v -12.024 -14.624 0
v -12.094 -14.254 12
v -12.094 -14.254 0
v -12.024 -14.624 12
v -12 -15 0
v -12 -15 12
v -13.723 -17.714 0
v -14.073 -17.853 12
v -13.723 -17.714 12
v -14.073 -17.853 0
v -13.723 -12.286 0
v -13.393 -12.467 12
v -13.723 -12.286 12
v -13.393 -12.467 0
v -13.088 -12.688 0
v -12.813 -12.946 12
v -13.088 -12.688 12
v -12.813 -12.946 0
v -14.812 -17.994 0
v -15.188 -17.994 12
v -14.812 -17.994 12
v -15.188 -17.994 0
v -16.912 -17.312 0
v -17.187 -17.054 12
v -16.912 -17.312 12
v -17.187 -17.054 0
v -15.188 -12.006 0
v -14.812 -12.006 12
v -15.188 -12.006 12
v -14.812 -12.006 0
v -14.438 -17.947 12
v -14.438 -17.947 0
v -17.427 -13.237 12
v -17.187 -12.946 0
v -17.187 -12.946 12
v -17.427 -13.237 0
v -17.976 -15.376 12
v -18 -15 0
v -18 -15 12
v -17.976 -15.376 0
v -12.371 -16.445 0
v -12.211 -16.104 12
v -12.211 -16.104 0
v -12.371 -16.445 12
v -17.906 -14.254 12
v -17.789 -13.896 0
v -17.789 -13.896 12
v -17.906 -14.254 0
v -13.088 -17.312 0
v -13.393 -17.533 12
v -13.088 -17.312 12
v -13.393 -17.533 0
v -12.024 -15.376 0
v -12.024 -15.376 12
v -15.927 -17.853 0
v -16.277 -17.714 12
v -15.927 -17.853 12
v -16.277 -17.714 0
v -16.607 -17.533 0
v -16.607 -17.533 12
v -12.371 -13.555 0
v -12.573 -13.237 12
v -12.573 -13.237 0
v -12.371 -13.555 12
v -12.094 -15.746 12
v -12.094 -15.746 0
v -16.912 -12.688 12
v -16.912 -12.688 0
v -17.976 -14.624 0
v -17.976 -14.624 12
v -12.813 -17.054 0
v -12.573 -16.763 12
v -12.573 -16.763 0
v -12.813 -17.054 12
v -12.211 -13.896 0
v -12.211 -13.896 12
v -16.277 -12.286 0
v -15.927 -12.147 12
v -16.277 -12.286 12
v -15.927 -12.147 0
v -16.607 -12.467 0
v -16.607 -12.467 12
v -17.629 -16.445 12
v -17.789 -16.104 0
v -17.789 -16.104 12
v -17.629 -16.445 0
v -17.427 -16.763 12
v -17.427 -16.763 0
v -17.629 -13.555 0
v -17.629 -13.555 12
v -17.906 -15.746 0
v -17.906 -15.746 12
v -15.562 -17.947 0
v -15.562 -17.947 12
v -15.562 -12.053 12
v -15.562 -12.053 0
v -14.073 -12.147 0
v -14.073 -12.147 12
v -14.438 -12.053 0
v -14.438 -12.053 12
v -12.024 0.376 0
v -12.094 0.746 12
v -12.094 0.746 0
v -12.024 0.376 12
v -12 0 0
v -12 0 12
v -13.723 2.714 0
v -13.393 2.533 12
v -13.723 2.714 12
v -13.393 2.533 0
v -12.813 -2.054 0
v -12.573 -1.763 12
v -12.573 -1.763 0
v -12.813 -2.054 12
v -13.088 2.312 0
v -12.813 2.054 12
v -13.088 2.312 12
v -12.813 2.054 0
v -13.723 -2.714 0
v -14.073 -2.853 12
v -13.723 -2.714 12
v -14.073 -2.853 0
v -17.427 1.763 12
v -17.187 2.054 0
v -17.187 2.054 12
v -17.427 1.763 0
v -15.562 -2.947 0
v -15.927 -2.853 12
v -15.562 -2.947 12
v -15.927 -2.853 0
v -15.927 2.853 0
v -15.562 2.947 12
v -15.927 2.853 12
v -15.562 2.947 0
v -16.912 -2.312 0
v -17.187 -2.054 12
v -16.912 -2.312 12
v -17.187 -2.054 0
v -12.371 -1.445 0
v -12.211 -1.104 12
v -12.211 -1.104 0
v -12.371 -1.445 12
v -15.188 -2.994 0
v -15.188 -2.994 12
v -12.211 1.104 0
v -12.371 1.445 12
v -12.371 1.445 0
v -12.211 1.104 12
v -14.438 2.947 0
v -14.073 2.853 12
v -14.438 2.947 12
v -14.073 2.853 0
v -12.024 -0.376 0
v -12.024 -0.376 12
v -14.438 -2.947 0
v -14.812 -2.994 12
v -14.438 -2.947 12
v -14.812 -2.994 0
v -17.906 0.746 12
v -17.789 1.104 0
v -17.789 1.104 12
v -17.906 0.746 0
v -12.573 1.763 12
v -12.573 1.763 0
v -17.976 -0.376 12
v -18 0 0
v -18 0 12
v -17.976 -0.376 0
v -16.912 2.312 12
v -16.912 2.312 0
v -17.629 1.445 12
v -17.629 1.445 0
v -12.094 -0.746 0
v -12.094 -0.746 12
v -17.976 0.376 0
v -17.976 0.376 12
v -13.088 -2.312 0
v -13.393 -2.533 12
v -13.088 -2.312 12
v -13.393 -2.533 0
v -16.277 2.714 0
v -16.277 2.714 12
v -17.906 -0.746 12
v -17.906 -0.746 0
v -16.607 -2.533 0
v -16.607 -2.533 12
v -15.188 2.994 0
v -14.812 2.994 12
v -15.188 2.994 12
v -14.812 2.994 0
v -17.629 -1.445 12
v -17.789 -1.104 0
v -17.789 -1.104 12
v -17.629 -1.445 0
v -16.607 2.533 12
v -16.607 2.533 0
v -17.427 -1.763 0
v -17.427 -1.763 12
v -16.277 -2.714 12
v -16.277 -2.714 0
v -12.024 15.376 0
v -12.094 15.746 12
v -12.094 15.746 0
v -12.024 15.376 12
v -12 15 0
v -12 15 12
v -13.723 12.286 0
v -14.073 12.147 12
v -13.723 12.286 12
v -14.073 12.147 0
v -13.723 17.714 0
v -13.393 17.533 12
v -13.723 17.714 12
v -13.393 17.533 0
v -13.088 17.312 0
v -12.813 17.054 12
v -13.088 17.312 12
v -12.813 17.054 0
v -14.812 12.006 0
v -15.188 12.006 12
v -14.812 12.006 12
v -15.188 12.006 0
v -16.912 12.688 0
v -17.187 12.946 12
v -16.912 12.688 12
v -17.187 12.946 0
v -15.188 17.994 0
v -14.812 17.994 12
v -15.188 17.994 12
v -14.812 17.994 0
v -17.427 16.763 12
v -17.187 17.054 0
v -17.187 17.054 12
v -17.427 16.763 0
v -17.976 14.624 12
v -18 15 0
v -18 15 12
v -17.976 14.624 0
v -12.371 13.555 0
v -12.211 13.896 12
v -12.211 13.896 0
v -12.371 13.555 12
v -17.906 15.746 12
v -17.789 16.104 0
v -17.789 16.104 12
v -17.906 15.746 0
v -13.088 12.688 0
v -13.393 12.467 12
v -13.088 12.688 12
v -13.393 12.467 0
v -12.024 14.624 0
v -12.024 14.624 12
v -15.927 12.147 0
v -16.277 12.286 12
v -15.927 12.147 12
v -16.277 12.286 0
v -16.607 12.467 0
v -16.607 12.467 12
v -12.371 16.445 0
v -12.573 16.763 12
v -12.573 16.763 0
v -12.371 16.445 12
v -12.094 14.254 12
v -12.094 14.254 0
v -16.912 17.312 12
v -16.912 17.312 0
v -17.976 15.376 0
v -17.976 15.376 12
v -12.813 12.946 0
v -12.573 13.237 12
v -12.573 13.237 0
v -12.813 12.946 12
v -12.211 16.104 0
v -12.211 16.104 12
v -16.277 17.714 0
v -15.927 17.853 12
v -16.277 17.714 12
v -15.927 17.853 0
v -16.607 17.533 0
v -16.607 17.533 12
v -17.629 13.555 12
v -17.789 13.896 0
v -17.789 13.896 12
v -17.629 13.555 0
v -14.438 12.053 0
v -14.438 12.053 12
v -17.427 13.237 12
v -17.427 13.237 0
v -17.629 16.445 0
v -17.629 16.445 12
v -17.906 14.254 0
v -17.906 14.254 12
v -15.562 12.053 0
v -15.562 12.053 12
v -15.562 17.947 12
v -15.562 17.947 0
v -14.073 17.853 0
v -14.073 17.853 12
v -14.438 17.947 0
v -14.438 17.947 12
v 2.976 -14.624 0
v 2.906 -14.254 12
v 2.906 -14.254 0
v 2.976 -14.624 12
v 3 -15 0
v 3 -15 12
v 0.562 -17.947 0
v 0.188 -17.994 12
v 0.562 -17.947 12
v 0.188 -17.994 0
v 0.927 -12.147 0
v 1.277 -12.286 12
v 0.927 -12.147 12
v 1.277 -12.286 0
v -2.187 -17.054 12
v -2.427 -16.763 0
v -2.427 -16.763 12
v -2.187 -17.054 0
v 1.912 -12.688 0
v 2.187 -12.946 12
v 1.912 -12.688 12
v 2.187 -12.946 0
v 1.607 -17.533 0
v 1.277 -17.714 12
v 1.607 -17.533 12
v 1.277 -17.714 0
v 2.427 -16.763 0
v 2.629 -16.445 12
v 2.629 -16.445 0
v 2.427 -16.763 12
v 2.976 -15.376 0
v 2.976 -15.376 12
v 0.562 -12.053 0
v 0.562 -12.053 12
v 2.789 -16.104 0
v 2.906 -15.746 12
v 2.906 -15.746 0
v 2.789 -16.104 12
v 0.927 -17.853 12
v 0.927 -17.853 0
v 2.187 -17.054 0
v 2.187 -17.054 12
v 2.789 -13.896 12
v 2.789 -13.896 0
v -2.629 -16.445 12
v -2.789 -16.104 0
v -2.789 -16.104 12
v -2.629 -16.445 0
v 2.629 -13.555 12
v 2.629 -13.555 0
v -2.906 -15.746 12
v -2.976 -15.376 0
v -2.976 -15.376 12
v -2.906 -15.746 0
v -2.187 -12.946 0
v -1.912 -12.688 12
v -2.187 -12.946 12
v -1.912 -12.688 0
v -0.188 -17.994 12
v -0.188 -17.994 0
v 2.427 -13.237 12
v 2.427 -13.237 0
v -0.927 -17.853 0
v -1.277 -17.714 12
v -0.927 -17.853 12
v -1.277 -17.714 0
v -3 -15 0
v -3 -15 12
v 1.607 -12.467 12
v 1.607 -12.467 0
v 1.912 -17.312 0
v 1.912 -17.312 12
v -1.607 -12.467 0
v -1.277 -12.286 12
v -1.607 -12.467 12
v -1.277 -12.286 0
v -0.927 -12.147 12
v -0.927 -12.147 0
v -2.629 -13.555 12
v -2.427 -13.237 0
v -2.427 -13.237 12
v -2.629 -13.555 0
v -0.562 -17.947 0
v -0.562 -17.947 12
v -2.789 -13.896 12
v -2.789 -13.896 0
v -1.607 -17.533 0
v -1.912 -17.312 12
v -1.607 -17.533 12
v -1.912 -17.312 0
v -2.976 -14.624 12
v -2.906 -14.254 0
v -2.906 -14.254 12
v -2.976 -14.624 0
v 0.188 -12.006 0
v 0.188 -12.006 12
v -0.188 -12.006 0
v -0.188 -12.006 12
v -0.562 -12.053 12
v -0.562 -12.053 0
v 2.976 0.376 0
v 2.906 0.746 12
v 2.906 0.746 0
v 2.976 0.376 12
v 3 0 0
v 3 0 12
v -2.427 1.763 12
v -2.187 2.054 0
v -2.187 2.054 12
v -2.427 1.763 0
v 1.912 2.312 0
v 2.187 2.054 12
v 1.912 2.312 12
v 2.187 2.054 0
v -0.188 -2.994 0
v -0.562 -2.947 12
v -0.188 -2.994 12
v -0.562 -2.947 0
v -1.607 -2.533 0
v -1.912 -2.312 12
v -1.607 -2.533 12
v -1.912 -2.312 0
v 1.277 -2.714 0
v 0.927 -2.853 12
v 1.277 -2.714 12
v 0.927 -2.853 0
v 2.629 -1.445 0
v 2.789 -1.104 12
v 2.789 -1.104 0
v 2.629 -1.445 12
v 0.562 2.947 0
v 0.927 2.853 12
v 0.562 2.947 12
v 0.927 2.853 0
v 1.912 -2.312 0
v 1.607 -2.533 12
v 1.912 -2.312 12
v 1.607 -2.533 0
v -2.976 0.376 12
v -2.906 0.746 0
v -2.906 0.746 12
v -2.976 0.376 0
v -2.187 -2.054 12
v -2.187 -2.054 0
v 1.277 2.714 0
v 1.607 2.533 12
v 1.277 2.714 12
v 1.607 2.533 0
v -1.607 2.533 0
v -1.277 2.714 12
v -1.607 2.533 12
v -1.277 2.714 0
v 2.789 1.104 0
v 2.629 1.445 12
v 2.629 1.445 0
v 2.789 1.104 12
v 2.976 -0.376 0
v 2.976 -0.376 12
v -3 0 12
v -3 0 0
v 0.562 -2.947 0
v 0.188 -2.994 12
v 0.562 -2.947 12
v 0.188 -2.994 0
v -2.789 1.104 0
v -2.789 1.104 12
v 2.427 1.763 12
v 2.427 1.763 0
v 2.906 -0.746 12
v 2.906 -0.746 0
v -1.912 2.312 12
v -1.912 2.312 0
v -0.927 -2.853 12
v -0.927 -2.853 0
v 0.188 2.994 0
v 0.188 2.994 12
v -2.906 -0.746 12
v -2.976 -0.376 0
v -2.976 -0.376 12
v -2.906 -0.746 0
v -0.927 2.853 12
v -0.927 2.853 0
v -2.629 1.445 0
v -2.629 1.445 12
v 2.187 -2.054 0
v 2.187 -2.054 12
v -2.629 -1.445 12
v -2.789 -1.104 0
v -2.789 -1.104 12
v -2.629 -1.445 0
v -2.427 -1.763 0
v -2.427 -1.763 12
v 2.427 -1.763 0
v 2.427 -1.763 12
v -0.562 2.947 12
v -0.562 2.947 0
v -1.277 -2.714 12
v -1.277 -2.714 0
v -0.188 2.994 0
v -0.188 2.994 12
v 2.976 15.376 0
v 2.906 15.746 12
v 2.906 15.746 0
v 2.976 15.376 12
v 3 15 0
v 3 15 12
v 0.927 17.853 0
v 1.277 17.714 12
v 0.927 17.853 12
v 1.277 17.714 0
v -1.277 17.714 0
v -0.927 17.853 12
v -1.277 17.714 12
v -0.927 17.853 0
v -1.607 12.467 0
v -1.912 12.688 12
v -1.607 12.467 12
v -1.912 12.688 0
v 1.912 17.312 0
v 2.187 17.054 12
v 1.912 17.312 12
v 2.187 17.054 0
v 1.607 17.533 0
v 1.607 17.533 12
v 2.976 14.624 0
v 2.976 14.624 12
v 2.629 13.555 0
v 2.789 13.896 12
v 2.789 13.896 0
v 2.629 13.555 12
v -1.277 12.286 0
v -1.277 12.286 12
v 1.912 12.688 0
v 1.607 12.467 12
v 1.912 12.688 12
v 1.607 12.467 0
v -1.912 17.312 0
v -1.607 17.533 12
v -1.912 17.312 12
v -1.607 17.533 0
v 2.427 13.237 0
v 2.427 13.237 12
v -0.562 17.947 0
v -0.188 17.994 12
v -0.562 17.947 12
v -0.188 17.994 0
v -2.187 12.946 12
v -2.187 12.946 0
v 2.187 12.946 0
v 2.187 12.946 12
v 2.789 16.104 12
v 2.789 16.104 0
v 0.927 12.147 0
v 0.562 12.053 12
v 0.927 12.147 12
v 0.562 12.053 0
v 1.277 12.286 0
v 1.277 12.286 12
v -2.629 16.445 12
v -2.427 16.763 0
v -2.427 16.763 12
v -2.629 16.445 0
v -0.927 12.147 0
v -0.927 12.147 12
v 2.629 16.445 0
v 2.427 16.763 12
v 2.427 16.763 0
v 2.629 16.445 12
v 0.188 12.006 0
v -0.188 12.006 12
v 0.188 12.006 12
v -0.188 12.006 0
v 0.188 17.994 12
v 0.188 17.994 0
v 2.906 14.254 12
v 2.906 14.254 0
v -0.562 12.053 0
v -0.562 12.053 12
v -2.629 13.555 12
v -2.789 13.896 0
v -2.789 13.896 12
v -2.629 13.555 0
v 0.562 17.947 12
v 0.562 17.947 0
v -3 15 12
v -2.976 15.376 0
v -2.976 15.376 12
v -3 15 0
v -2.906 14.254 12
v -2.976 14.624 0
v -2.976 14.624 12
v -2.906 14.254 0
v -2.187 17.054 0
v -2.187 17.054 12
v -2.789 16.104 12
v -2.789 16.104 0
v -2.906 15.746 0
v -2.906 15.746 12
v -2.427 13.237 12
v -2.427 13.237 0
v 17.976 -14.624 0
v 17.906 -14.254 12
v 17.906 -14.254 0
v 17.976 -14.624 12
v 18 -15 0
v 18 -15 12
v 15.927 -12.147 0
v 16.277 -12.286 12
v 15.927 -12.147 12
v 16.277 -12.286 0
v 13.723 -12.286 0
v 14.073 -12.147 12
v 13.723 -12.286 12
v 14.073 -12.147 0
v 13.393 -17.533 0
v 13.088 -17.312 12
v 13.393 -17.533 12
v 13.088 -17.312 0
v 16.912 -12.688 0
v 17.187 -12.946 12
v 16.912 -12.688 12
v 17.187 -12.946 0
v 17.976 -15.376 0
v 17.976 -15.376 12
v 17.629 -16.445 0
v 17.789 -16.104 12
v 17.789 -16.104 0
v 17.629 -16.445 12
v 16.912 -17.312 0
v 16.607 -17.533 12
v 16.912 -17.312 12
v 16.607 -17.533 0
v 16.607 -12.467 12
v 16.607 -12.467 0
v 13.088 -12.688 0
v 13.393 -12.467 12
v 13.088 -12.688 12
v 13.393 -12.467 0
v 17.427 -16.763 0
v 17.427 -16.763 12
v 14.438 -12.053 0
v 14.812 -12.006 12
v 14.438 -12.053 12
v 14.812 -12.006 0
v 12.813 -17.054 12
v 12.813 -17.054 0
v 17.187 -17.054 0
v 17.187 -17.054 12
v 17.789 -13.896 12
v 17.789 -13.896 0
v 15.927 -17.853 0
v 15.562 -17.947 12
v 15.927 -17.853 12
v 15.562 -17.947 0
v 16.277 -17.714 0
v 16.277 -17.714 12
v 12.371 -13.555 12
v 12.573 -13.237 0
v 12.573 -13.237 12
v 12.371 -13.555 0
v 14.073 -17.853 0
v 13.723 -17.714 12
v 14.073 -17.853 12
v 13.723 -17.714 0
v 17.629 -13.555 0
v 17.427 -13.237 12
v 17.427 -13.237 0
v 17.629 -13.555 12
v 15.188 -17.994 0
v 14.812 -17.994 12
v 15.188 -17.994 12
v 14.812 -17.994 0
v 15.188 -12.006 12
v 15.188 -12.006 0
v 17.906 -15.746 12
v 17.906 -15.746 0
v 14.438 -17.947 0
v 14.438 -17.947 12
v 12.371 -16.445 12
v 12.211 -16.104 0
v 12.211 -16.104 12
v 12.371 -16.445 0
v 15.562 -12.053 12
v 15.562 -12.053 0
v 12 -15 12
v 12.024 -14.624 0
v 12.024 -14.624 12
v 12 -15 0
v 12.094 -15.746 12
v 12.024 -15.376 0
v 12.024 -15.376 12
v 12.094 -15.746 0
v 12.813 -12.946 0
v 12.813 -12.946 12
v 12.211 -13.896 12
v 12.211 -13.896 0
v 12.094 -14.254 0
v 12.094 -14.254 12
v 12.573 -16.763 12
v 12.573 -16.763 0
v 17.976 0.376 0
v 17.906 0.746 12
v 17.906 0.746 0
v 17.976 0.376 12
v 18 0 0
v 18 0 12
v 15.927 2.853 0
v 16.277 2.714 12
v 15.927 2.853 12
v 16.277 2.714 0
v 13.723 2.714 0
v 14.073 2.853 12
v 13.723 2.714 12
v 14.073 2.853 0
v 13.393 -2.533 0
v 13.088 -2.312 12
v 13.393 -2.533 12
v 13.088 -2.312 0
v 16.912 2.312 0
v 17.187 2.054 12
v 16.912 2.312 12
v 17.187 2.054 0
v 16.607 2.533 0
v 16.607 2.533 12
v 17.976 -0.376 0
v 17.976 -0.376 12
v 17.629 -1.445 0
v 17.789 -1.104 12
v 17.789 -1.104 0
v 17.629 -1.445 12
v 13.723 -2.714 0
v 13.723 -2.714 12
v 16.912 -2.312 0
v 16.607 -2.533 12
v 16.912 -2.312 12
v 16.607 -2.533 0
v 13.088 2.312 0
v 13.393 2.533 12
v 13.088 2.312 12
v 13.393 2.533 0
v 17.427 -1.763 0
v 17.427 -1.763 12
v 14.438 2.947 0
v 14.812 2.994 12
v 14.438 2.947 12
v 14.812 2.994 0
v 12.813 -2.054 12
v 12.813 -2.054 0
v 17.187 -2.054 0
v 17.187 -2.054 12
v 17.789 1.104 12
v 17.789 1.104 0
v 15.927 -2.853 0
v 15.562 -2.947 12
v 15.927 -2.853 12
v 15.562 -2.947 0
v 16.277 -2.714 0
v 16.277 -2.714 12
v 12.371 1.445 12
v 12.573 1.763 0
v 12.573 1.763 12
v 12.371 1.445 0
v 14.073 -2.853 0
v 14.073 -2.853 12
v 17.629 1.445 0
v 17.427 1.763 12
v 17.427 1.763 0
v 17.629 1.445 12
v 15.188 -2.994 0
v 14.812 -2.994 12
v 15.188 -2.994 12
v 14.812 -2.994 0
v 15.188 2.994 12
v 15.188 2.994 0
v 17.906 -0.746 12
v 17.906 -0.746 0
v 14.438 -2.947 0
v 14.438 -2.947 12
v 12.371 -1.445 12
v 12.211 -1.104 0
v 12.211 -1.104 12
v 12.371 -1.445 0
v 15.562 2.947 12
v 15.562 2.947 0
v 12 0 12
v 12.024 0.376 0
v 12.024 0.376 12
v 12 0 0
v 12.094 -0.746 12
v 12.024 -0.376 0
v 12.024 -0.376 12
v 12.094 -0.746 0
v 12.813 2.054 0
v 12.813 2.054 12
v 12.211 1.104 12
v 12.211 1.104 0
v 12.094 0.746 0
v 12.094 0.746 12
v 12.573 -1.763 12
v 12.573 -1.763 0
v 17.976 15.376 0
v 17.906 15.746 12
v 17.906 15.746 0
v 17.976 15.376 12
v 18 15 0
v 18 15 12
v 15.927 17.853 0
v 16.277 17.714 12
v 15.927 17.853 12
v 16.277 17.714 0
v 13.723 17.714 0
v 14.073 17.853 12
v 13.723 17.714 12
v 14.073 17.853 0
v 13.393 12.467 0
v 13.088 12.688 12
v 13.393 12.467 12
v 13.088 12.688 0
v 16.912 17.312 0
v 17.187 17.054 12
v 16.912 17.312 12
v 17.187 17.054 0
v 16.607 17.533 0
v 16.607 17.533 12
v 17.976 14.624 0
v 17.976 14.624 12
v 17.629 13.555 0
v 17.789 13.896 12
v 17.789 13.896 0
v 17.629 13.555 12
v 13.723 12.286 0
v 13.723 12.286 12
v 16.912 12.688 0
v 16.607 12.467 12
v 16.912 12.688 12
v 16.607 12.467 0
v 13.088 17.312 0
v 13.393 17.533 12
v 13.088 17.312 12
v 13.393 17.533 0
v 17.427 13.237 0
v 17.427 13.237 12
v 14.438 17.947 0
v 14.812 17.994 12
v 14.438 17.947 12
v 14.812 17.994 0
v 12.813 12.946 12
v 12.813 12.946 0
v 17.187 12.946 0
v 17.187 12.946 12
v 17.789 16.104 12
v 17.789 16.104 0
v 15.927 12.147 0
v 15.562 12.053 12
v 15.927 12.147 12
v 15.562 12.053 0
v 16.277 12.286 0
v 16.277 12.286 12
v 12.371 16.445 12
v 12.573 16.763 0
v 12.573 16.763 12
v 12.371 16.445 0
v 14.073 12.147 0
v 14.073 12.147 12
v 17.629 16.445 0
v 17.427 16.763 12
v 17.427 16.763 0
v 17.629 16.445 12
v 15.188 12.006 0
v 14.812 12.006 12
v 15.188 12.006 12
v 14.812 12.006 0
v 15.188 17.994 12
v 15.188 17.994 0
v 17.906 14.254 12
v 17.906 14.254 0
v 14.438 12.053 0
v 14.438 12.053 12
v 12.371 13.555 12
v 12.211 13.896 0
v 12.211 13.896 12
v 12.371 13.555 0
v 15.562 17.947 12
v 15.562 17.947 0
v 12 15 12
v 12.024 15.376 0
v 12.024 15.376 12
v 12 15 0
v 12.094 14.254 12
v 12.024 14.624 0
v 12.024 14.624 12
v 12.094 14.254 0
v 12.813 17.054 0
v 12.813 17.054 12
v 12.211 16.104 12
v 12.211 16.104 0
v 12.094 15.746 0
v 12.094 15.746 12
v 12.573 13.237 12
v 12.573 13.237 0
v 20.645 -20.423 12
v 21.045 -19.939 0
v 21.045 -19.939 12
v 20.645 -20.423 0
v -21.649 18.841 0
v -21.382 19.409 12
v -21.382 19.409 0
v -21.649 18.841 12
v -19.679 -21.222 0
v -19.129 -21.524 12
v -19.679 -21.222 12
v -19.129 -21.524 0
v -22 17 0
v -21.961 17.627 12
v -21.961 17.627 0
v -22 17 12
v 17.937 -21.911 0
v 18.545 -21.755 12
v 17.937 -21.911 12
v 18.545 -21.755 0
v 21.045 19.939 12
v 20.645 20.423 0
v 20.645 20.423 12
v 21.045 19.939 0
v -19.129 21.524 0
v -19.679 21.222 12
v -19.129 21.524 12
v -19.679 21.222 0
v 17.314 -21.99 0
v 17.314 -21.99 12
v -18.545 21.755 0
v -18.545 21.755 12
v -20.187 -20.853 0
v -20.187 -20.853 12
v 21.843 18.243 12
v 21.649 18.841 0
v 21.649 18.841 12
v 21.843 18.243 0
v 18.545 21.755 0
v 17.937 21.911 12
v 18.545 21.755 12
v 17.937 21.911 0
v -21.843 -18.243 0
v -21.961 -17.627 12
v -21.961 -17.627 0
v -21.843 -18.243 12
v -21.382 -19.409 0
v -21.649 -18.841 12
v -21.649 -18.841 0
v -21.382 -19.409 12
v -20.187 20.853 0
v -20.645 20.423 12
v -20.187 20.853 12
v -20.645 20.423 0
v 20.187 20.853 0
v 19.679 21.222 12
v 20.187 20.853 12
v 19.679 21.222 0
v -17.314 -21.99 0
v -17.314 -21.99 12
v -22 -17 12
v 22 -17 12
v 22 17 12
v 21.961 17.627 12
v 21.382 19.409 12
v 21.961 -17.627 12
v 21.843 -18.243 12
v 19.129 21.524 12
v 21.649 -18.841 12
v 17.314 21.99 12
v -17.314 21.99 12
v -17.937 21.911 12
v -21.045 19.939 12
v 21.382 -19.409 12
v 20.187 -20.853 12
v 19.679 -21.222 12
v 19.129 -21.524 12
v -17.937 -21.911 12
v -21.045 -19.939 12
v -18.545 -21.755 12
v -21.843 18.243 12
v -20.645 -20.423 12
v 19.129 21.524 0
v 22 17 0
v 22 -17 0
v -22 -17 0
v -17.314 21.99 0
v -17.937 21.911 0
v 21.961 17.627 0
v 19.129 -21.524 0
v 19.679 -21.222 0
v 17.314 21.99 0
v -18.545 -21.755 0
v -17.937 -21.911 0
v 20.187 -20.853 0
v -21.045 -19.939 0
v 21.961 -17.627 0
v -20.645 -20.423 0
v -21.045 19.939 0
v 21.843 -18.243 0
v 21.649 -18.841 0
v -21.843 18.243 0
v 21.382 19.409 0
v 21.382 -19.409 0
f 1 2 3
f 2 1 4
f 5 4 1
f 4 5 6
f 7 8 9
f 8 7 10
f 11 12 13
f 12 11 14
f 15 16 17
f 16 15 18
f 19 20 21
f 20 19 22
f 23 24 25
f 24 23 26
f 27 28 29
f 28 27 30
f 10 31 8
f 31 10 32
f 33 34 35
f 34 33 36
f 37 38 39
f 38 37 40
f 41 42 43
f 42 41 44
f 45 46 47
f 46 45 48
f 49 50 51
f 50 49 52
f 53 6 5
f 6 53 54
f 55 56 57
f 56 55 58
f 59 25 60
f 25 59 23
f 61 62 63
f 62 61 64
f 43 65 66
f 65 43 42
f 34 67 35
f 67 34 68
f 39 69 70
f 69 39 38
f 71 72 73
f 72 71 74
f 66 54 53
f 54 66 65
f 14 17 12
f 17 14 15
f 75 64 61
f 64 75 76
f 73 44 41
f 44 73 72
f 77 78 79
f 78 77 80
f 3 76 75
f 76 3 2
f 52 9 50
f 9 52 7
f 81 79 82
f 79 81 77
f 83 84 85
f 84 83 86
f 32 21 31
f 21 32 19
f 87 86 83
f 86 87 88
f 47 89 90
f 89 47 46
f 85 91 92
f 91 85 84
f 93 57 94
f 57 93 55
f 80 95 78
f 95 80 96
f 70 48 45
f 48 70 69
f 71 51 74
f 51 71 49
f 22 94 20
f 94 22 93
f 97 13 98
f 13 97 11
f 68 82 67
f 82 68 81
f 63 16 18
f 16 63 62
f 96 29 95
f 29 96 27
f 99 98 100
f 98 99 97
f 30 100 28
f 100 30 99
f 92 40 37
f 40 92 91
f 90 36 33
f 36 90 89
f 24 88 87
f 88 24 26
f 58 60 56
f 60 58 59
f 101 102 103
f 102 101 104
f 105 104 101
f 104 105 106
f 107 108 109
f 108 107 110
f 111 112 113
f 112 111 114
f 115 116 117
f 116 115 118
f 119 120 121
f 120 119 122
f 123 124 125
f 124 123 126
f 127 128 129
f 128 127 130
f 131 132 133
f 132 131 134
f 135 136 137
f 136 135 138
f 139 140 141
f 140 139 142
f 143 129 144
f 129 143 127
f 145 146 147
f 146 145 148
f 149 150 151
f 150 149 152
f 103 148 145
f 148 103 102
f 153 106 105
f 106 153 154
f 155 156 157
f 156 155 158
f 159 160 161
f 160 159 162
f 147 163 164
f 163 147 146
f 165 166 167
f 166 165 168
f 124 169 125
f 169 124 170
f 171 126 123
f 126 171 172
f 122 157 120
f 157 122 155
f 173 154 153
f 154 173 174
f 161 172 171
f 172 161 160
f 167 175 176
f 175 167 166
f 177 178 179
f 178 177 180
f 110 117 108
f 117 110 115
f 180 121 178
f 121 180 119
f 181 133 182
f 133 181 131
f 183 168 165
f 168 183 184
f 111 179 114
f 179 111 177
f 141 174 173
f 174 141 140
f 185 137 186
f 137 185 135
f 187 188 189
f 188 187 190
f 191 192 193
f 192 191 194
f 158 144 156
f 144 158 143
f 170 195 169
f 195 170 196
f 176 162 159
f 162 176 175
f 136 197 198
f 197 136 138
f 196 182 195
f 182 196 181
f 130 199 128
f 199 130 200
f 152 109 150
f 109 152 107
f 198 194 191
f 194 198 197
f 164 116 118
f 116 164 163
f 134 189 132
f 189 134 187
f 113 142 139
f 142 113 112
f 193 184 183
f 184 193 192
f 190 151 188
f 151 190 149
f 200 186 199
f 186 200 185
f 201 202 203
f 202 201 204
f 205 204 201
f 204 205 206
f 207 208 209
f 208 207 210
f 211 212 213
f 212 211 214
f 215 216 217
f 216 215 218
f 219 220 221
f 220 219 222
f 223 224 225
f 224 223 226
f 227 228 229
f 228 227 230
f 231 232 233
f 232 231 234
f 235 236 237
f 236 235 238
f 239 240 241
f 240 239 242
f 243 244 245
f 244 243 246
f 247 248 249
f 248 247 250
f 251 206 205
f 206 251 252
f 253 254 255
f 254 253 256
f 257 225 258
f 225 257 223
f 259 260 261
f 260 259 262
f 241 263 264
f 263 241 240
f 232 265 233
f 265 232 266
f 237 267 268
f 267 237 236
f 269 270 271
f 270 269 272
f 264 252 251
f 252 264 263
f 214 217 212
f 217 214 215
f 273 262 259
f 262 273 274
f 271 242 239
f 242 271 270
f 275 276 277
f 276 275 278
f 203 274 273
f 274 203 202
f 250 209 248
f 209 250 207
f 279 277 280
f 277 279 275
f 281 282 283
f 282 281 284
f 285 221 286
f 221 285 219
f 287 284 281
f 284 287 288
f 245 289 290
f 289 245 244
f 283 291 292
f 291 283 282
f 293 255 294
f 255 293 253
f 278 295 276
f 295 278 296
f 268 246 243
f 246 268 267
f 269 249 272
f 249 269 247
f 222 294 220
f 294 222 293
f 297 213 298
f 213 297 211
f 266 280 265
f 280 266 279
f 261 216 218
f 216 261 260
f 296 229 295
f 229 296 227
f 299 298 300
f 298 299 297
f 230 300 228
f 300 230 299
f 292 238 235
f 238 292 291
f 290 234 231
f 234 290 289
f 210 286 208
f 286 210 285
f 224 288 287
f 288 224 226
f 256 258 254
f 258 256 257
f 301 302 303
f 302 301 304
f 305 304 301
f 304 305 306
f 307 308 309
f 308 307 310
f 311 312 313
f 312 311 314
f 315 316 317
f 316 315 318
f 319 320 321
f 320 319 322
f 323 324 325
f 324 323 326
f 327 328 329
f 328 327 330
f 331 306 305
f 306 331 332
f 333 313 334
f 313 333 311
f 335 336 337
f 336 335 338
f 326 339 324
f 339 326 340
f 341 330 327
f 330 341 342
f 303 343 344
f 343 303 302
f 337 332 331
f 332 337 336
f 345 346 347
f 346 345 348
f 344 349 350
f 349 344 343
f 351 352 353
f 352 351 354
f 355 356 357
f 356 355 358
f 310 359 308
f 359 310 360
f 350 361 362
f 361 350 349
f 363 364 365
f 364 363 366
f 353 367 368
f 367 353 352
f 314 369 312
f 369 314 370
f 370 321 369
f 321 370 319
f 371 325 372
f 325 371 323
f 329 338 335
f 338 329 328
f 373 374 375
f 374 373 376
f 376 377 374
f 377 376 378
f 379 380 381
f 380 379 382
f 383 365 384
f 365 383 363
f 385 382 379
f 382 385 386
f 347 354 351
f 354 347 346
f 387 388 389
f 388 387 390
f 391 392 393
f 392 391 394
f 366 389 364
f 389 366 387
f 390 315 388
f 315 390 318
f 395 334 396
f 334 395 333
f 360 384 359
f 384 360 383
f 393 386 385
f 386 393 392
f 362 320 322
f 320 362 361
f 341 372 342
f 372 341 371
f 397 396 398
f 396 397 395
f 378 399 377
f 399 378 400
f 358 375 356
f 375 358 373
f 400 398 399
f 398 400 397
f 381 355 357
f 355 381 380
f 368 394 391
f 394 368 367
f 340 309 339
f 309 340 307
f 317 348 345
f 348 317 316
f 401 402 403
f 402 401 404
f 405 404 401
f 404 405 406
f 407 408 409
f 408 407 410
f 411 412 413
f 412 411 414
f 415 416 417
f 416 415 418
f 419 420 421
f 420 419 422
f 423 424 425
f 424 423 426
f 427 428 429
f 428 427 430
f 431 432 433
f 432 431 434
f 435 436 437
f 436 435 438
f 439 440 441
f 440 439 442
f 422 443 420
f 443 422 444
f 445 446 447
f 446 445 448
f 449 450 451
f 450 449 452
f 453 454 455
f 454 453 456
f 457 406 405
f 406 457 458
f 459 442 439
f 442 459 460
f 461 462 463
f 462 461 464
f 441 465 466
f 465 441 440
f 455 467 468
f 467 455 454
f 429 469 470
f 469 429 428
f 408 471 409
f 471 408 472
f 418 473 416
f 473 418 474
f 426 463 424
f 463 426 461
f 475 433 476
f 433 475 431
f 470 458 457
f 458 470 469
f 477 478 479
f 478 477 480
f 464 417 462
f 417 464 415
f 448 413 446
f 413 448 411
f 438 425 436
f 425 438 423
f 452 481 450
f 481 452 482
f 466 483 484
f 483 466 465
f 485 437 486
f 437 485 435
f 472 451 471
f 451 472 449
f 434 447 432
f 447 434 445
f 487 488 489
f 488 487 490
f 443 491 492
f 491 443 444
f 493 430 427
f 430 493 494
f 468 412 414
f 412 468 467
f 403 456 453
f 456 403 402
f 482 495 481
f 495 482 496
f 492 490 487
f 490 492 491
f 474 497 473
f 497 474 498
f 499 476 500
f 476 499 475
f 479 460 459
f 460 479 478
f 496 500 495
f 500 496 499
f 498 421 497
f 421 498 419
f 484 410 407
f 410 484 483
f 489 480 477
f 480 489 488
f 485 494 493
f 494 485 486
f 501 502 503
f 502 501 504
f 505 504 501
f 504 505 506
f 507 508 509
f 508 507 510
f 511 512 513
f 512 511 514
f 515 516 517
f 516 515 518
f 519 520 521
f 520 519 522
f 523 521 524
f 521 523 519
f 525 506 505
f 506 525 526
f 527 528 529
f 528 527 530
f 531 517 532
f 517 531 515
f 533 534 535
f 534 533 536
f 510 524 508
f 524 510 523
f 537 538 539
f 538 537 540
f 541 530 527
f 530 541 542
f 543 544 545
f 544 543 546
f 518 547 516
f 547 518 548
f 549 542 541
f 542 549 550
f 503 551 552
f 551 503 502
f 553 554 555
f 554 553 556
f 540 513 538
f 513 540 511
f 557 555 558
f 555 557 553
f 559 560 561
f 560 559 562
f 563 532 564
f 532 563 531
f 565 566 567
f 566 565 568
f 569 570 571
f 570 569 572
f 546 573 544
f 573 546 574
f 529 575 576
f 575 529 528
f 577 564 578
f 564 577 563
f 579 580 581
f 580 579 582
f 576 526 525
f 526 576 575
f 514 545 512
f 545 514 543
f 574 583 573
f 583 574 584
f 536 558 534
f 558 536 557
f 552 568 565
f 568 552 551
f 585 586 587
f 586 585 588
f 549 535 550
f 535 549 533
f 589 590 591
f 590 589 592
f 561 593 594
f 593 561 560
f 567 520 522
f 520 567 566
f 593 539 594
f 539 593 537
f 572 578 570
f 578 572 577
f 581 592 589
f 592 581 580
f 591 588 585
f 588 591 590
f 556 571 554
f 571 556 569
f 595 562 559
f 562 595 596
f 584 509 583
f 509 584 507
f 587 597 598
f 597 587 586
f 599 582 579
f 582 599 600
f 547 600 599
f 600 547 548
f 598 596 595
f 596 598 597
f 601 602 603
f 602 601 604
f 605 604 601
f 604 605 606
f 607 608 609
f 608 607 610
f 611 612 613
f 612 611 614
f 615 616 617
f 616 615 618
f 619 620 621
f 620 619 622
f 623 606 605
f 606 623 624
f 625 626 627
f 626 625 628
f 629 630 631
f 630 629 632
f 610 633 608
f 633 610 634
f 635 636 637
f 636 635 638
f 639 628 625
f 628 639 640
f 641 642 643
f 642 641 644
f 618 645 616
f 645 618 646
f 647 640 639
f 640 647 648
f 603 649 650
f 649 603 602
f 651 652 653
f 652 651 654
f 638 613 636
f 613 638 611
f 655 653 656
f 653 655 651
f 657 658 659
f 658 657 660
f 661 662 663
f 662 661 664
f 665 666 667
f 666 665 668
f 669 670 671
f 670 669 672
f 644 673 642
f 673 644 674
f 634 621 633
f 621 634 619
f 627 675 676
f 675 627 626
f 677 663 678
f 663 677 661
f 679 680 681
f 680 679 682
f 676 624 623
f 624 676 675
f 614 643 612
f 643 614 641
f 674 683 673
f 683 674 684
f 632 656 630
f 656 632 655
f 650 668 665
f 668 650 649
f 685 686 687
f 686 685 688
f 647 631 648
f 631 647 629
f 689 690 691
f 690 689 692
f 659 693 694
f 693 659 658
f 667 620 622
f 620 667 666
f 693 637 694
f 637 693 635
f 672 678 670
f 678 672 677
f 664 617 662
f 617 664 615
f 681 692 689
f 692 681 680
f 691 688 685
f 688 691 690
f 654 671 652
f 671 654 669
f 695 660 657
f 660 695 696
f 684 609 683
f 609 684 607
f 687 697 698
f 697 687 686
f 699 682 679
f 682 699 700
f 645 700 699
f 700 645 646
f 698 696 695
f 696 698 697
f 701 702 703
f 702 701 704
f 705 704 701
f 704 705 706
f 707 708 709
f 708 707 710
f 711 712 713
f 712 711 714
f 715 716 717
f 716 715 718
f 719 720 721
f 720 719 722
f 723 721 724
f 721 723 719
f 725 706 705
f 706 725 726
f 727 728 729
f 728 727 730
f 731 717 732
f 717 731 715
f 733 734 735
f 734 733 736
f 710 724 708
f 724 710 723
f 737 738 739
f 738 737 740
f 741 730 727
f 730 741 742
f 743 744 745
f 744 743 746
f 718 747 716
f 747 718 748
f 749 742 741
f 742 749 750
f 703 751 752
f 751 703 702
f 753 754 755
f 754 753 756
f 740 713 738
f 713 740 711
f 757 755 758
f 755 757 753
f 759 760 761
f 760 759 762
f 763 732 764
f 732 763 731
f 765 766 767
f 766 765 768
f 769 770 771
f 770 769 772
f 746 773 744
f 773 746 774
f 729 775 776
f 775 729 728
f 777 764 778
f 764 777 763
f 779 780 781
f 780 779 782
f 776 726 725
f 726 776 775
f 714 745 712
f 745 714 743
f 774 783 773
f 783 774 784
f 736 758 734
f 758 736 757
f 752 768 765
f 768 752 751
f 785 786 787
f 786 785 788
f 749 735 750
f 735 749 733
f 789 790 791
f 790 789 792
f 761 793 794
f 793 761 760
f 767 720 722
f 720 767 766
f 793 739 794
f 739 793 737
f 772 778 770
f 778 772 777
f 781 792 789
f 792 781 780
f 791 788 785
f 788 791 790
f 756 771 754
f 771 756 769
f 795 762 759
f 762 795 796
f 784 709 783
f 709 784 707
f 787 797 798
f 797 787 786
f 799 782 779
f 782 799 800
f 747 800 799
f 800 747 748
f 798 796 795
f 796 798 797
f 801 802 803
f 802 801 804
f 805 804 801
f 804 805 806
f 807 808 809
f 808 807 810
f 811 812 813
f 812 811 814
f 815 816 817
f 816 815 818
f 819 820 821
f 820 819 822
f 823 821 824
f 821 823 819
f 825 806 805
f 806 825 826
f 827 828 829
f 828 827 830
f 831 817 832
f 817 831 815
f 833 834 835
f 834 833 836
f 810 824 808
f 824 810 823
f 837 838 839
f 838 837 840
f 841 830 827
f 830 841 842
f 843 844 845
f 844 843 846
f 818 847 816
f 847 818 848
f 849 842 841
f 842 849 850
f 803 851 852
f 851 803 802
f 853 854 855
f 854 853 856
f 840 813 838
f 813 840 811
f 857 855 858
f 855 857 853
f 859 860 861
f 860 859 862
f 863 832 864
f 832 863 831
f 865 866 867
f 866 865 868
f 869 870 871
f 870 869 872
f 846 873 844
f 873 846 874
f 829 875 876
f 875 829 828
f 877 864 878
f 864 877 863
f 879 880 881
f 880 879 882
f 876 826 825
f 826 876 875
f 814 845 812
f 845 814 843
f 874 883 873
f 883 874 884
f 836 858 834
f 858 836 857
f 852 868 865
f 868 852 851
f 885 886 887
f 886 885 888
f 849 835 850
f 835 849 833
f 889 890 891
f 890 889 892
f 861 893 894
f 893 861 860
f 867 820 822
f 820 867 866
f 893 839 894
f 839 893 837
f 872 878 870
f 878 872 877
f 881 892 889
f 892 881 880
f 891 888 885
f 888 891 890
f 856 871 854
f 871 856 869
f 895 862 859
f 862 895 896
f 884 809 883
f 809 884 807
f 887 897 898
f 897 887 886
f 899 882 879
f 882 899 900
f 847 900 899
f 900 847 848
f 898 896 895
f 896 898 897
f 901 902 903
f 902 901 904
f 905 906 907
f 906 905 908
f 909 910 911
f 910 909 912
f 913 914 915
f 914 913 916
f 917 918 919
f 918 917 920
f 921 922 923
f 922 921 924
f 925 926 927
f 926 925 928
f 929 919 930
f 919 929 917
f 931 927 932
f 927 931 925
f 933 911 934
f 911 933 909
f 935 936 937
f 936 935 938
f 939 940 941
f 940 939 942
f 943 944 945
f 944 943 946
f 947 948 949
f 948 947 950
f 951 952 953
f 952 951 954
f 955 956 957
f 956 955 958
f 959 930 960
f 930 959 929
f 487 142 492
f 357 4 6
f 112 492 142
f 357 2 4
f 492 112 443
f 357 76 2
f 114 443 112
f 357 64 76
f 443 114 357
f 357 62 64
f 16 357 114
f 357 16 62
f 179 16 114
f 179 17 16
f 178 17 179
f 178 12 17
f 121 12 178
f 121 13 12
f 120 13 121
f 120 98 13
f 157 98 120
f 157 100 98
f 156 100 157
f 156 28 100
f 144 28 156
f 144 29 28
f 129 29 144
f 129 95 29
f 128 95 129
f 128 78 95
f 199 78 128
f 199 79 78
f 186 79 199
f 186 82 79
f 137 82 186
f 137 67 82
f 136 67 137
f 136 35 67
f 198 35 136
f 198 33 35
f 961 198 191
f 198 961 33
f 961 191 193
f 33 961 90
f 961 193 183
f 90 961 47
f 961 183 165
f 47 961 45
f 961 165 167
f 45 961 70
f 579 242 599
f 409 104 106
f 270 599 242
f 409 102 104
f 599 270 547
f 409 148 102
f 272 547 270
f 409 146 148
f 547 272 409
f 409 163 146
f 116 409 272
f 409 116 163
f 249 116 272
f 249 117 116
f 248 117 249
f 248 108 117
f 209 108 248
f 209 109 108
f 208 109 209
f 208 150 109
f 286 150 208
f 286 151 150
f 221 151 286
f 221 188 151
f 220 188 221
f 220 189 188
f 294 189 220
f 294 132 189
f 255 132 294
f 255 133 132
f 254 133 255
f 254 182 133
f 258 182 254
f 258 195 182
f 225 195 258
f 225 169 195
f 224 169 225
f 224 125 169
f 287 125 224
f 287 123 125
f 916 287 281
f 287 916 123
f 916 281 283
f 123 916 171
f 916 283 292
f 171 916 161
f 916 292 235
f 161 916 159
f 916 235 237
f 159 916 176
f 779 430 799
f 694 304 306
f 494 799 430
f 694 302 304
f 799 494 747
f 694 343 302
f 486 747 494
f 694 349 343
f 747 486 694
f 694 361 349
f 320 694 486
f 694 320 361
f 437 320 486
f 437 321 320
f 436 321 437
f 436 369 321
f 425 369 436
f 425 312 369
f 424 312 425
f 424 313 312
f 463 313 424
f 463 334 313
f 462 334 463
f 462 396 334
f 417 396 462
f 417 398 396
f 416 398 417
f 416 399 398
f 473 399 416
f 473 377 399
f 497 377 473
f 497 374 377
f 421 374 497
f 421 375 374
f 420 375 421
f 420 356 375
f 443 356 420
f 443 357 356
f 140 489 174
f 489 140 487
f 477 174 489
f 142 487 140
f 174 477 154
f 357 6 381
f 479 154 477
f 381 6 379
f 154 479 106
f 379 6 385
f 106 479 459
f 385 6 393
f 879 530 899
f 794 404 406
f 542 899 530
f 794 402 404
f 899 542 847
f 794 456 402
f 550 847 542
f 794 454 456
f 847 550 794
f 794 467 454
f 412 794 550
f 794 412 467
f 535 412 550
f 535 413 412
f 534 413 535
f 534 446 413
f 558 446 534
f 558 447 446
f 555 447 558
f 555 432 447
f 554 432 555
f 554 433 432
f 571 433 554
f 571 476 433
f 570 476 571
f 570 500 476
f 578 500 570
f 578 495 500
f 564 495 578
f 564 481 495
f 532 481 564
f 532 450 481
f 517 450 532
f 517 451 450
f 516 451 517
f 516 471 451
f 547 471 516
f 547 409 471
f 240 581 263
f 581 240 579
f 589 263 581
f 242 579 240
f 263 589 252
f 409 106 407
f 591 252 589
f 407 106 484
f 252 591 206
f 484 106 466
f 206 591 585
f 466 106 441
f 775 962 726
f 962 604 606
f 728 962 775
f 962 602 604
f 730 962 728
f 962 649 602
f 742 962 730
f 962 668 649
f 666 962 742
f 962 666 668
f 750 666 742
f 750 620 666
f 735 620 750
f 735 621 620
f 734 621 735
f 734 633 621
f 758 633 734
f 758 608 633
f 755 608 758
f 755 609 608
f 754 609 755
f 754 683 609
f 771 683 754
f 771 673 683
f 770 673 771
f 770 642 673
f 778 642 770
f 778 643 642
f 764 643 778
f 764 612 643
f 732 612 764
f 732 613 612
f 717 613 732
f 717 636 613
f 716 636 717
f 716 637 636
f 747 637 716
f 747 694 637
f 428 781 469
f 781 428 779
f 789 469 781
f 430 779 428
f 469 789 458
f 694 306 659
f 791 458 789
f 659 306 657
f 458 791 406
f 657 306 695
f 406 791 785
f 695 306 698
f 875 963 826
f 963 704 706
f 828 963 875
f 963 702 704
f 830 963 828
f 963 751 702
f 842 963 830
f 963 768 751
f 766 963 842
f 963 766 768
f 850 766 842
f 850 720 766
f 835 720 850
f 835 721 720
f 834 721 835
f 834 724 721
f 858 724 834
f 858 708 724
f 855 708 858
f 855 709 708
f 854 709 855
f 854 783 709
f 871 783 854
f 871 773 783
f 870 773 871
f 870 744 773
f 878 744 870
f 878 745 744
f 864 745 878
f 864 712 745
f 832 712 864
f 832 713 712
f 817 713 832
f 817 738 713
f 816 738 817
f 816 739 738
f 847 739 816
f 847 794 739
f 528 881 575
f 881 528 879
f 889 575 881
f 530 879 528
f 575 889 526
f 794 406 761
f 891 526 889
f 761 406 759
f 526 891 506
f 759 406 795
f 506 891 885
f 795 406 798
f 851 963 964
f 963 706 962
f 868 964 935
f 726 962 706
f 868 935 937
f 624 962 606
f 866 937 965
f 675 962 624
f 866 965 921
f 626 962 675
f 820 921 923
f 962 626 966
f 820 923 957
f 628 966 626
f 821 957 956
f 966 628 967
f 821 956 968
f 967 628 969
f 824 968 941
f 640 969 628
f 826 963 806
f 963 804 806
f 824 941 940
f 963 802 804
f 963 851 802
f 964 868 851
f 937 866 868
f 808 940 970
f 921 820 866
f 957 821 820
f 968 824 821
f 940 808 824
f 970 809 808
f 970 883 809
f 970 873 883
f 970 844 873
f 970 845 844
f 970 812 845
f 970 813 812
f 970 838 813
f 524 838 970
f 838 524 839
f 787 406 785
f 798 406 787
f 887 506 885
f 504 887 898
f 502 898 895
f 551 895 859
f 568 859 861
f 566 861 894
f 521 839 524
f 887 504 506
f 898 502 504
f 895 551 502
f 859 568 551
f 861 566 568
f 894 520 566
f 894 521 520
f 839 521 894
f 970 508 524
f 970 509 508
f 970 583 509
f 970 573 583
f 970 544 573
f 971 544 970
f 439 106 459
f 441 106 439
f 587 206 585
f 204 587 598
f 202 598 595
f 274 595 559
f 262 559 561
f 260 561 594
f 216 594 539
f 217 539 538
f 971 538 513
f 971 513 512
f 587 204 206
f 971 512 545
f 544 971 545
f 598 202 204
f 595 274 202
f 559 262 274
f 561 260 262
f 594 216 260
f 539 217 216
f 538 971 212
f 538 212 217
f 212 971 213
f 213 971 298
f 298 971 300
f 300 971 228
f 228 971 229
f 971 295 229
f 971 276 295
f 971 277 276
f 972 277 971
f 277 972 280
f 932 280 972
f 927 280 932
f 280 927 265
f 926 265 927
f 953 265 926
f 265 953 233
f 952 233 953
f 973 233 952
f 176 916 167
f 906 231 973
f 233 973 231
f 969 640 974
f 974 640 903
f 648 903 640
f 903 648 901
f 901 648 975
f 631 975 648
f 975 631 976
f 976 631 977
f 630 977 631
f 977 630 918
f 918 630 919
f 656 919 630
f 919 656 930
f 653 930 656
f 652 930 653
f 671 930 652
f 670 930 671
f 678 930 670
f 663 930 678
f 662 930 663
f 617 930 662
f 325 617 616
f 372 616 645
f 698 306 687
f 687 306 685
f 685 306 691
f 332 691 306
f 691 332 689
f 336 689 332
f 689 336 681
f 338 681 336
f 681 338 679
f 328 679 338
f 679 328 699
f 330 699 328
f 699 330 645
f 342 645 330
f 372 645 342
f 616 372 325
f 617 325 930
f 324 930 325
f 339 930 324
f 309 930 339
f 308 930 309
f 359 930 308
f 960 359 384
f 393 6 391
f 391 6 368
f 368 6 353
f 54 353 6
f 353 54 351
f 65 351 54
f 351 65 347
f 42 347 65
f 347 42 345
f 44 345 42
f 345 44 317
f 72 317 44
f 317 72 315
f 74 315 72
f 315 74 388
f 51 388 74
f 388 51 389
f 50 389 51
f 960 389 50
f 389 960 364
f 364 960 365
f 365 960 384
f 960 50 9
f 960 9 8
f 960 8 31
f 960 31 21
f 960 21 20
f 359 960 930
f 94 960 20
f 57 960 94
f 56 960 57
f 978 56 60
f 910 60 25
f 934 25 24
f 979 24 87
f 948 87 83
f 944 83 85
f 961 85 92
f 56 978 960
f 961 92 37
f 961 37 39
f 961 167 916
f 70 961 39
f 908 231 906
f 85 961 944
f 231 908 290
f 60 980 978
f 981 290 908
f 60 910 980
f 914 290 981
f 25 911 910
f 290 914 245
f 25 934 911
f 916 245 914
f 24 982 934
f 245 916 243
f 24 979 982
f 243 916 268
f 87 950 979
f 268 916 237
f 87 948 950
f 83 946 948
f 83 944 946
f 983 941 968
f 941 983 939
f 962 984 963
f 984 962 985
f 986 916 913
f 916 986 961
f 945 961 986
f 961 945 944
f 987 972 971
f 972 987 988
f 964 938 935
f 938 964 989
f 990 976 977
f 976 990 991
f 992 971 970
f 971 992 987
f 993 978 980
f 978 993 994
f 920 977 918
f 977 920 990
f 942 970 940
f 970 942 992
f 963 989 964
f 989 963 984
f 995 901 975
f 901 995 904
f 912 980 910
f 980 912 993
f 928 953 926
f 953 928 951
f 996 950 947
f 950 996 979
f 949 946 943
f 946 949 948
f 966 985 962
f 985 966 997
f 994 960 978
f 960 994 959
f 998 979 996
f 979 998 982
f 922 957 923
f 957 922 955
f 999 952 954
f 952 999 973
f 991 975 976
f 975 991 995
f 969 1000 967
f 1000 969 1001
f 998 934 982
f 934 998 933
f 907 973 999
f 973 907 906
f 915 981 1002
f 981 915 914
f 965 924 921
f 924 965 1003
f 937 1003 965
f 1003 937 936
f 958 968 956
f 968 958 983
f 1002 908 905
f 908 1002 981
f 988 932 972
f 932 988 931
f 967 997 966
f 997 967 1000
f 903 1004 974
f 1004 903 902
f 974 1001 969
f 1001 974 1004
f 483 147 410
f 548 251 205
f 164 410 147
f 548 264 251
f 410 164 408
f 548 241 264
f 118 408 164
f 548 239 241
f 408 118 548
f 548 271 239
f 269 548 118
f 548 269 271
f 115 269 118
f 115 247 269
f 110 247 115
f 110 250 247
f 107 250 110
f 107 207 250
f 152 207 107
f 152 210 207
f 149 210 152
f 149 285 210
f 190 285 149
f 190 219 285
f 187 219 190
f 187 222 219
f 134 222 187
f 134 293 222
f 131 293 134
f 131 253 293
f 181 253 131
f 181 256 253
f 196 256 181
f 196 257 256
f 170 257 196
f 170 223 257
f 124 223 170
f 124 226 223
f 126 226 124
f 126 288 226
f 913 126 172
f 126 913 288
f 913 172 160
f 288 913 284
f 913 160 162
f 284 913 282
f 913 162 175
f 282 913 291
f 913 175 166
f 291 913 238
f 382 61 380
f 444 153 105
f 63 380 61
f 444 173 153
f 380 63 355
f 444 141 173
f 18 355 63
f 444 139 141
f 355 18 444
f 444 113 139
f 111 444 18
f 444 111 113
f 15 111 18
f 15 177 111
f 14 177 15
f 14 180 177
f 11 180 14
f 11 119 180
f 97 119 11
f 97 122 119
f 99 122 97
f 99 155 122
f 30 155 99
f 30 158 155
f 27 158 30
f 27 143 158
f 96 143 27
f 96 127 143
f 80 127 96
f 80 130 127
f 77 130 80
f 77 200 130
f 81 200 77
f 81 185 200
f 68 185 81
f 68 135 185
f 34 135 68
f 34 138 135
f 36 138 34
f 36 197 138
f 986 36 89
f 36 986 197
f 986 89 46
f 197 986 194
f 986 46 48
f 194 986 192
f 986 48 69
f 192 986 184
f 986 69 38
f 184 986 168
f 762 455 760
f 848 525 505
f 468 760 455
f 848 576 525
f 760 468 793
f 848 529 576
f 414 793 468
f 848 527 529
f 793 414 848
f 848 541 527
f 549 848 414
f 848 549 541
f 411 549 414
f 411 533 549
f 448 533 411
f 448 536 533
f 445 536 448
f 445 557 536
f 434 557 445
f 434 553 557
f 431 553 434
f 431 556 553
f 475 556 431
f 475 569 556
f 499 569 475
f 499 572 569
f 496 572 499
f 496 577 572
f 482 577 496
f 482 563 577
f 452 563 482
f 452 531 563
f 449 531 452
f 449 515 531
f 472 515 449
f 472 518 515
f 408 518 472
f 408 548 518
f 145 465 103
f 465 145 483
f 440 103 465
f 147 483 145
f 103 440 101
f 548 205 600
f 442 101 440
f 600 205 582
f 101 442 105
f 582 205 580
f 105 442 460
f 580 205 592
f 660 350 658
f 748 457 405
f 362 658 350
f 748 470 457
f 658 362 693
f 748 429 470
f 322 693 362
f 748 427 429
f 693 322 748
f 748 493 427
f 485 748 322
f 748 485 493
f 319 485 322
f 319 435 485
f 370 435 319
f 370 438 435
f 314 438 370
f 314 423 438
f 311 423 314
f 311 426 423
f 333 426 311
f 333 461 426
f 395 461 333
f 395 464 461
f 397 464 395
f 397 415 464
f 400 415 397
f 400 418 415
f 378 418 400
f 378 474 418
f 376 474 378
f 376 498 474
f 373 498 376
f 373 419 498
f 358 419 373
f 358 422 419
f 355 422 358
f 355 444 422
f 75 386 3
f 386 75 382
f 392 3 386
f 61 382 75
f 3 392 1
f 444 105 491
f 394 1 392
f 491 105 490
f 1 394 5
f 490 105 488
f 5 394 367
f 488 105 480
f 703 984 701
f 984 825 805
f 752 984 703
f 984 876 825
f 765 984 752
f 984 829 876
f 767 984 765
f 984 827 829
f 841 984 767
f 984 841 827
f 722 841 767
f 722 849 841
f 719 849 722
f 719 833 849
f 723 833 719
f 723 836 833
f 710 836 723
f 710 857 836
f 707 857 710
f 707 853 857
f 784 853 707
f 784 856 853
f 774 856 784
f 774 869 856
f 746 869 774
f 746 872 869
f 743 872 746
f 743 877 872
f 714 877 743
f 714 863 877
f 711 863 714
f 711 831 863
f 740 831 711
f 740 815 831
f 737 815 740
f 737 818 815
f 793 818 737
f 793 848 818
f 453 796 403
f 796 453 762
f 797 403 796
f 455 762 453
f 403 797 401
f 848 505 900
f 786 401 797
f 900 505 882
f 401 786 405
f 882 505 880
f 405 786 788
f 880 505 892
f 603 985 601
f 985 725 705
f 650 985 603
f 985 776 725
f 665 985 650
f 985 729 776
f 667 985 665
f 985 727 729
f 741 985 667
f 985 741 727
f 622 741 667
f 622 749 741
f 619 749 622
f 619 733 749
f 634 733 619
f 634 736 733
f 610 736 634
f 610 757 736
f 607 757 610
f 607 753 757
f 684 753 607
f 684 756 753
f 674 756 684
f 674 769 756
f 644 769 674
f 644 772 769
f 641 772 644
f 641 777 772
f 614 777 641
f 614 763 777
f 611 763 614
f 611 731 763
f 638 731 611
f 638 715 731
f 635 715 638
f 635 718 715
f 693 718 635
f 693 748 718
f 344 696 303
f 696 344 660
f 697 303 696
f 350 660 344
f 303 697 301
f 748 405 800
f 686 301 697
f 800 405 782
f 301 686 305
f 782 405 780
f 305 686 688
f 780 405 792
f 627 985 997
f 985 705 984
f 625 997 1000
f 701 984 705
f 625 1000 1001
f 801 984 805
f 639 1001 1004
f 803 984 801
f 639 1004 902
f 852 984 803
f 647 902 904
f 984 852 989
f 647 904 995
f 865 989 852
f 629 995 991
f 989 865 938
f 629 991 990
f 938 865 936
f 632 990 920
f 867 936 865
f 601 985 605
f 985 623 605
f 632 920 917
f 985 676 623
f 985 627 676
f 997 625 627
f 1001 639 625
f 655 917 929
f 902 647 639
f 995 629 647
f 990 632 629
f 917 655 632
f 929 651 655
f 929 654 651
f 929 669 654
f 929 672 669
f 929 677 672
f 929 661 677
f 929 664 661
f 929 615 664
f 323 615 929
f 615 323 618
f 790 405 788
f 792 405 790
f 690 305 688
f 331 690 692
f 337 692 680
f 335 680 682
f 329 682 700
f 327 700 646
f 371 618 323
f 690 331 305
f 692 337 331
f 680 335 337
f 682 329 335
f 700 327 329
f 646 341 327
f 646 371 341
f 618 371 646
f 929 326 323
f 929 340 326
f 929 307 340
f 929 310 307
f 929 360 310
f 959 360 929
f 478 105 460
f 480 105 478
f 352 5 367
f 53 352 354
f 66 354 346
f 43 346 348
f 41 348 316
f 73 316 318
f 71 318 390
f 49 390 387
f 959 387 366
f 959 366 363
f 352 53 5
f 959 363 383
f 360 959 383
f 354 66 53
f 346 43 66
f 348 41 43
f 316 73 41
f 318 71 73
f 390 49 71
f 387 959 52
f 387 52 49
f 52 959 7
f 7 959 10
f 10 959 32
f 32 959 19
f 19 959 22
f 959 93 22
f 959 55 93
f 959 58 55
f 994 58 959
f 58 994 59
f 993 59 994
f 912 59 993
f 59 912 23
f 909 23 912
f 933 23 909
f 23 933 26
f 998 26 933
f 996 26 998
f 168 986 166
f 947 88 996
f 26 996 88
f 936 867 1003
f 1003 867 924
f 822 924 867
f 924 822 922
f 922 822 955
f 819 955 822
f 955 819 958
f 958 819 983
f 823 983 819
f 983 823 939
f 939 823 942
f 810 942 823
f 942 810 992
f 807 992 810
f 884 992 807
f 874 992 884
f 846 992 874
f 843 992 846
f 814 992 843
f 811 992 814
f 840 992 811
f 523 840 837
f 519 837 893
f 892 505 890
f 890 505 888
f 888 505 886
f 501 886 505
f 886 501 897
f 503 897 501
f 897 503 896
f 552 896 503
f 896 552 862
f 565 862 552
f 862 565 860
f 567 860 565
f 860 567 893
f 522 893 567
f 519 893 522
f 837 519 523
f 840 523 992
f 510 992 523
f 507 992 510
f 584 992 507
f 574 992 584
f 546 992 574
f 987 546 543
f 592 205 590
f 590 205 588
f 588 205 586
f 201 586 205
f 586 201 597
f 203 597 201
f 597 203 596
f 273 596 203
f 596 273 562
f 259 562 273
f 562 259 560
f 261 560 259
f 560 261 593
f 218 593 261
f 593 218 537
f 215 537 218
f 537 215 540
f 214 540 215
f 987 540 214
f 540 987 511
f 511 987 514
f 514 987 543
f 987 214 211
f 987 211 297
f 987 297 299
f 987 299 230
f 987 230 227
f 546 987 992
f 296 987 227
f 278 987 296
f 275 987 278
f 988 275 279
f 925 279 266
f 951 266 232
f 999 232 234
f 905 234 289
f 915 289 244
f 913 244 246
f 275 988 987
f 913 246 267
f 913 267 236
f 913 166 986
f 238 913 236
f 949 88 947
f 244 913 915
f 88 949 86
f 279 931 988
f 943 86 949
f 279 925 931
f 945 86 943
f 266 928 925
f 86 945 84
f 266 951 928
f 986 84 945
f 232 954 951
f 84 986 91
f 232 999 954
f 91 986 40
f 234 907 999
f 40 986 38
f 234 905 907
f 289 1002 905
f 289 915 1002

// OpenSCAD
$fn = 50;


difference() {
	union() {
		hull() {
			translate(v = [-17.0000000000, 17.0000000000, 0]) {
				cylinder(h = 12, r = 5);
			}
			translate(v = [17.0000000000, 17.0000000000, 0]) {
				cylinder(h = 12, r = 5);
			}
			translate(v = [-17.0000000000, -17.0000000000, 0]) {
				cylinder(h = 12, r = 5);
			}
			translate(v = [17.0000000000, -17.0000000000, 0]) {
				cylinder(h = 12, r = 5);
			}
		}
	}
	union() {
		translate(v = [-15.0000000000, -15.0000000000, 0]) {
			translate(v = [0, 0, -100]) {
				cylinder(h = 200, r = 3.0000000000);
			}
		}
		translate(v = [-15.0000000000, 0.0000000000, 0]) {
			translate(v = [0, 0, -100]) {
				cylinder(h = 200, r = 3.0000000000);
			}
		}
		translate(v = [-15.0000000000, 15.0000000000, 0]) {
			translate(v = [0, 0, -100]) {
				cylinder(h = 200, r = 3.0000000000);
			}
		}
		translate(v = [0.0000000000, -15.0000000000, 0]) {
			translate(v = [0, 0, -100]) {
				cylinder(h = 200, r = 3.0000000000);
			}
		}
		translate(v = [0, 0, -100]) {
			cylinder(h = 200, r = 3.0000000000);
		}
		translate(v = [0.0000000000, 15.0000000000, 0]) {
			translate(v = [0, 0, -100]) {
				cylinder(h = 200, r = 3.0000000000);
			}
		}
		translate(v = [15.0000000000, -15.0000000000, 0]) {
			translate(v = [0, 0, -100]) {
				cylinder(h = 200, r = 3.0000000000);
			}
		}
		translate(v = [15.0000000000, 0.0000000000, 0]) {
			translate(v = [0, 0, -100]) {
				cylinder(h = 200, r = 3.0000000000);
			}
		}
		translate(v = [15.0000000000, 15.0000000000, 0]) {
			translate(v = [0, 0, -100]) {
				cylinder(h = 200, r = 3.0000000000);
			}
		}
	}
}
